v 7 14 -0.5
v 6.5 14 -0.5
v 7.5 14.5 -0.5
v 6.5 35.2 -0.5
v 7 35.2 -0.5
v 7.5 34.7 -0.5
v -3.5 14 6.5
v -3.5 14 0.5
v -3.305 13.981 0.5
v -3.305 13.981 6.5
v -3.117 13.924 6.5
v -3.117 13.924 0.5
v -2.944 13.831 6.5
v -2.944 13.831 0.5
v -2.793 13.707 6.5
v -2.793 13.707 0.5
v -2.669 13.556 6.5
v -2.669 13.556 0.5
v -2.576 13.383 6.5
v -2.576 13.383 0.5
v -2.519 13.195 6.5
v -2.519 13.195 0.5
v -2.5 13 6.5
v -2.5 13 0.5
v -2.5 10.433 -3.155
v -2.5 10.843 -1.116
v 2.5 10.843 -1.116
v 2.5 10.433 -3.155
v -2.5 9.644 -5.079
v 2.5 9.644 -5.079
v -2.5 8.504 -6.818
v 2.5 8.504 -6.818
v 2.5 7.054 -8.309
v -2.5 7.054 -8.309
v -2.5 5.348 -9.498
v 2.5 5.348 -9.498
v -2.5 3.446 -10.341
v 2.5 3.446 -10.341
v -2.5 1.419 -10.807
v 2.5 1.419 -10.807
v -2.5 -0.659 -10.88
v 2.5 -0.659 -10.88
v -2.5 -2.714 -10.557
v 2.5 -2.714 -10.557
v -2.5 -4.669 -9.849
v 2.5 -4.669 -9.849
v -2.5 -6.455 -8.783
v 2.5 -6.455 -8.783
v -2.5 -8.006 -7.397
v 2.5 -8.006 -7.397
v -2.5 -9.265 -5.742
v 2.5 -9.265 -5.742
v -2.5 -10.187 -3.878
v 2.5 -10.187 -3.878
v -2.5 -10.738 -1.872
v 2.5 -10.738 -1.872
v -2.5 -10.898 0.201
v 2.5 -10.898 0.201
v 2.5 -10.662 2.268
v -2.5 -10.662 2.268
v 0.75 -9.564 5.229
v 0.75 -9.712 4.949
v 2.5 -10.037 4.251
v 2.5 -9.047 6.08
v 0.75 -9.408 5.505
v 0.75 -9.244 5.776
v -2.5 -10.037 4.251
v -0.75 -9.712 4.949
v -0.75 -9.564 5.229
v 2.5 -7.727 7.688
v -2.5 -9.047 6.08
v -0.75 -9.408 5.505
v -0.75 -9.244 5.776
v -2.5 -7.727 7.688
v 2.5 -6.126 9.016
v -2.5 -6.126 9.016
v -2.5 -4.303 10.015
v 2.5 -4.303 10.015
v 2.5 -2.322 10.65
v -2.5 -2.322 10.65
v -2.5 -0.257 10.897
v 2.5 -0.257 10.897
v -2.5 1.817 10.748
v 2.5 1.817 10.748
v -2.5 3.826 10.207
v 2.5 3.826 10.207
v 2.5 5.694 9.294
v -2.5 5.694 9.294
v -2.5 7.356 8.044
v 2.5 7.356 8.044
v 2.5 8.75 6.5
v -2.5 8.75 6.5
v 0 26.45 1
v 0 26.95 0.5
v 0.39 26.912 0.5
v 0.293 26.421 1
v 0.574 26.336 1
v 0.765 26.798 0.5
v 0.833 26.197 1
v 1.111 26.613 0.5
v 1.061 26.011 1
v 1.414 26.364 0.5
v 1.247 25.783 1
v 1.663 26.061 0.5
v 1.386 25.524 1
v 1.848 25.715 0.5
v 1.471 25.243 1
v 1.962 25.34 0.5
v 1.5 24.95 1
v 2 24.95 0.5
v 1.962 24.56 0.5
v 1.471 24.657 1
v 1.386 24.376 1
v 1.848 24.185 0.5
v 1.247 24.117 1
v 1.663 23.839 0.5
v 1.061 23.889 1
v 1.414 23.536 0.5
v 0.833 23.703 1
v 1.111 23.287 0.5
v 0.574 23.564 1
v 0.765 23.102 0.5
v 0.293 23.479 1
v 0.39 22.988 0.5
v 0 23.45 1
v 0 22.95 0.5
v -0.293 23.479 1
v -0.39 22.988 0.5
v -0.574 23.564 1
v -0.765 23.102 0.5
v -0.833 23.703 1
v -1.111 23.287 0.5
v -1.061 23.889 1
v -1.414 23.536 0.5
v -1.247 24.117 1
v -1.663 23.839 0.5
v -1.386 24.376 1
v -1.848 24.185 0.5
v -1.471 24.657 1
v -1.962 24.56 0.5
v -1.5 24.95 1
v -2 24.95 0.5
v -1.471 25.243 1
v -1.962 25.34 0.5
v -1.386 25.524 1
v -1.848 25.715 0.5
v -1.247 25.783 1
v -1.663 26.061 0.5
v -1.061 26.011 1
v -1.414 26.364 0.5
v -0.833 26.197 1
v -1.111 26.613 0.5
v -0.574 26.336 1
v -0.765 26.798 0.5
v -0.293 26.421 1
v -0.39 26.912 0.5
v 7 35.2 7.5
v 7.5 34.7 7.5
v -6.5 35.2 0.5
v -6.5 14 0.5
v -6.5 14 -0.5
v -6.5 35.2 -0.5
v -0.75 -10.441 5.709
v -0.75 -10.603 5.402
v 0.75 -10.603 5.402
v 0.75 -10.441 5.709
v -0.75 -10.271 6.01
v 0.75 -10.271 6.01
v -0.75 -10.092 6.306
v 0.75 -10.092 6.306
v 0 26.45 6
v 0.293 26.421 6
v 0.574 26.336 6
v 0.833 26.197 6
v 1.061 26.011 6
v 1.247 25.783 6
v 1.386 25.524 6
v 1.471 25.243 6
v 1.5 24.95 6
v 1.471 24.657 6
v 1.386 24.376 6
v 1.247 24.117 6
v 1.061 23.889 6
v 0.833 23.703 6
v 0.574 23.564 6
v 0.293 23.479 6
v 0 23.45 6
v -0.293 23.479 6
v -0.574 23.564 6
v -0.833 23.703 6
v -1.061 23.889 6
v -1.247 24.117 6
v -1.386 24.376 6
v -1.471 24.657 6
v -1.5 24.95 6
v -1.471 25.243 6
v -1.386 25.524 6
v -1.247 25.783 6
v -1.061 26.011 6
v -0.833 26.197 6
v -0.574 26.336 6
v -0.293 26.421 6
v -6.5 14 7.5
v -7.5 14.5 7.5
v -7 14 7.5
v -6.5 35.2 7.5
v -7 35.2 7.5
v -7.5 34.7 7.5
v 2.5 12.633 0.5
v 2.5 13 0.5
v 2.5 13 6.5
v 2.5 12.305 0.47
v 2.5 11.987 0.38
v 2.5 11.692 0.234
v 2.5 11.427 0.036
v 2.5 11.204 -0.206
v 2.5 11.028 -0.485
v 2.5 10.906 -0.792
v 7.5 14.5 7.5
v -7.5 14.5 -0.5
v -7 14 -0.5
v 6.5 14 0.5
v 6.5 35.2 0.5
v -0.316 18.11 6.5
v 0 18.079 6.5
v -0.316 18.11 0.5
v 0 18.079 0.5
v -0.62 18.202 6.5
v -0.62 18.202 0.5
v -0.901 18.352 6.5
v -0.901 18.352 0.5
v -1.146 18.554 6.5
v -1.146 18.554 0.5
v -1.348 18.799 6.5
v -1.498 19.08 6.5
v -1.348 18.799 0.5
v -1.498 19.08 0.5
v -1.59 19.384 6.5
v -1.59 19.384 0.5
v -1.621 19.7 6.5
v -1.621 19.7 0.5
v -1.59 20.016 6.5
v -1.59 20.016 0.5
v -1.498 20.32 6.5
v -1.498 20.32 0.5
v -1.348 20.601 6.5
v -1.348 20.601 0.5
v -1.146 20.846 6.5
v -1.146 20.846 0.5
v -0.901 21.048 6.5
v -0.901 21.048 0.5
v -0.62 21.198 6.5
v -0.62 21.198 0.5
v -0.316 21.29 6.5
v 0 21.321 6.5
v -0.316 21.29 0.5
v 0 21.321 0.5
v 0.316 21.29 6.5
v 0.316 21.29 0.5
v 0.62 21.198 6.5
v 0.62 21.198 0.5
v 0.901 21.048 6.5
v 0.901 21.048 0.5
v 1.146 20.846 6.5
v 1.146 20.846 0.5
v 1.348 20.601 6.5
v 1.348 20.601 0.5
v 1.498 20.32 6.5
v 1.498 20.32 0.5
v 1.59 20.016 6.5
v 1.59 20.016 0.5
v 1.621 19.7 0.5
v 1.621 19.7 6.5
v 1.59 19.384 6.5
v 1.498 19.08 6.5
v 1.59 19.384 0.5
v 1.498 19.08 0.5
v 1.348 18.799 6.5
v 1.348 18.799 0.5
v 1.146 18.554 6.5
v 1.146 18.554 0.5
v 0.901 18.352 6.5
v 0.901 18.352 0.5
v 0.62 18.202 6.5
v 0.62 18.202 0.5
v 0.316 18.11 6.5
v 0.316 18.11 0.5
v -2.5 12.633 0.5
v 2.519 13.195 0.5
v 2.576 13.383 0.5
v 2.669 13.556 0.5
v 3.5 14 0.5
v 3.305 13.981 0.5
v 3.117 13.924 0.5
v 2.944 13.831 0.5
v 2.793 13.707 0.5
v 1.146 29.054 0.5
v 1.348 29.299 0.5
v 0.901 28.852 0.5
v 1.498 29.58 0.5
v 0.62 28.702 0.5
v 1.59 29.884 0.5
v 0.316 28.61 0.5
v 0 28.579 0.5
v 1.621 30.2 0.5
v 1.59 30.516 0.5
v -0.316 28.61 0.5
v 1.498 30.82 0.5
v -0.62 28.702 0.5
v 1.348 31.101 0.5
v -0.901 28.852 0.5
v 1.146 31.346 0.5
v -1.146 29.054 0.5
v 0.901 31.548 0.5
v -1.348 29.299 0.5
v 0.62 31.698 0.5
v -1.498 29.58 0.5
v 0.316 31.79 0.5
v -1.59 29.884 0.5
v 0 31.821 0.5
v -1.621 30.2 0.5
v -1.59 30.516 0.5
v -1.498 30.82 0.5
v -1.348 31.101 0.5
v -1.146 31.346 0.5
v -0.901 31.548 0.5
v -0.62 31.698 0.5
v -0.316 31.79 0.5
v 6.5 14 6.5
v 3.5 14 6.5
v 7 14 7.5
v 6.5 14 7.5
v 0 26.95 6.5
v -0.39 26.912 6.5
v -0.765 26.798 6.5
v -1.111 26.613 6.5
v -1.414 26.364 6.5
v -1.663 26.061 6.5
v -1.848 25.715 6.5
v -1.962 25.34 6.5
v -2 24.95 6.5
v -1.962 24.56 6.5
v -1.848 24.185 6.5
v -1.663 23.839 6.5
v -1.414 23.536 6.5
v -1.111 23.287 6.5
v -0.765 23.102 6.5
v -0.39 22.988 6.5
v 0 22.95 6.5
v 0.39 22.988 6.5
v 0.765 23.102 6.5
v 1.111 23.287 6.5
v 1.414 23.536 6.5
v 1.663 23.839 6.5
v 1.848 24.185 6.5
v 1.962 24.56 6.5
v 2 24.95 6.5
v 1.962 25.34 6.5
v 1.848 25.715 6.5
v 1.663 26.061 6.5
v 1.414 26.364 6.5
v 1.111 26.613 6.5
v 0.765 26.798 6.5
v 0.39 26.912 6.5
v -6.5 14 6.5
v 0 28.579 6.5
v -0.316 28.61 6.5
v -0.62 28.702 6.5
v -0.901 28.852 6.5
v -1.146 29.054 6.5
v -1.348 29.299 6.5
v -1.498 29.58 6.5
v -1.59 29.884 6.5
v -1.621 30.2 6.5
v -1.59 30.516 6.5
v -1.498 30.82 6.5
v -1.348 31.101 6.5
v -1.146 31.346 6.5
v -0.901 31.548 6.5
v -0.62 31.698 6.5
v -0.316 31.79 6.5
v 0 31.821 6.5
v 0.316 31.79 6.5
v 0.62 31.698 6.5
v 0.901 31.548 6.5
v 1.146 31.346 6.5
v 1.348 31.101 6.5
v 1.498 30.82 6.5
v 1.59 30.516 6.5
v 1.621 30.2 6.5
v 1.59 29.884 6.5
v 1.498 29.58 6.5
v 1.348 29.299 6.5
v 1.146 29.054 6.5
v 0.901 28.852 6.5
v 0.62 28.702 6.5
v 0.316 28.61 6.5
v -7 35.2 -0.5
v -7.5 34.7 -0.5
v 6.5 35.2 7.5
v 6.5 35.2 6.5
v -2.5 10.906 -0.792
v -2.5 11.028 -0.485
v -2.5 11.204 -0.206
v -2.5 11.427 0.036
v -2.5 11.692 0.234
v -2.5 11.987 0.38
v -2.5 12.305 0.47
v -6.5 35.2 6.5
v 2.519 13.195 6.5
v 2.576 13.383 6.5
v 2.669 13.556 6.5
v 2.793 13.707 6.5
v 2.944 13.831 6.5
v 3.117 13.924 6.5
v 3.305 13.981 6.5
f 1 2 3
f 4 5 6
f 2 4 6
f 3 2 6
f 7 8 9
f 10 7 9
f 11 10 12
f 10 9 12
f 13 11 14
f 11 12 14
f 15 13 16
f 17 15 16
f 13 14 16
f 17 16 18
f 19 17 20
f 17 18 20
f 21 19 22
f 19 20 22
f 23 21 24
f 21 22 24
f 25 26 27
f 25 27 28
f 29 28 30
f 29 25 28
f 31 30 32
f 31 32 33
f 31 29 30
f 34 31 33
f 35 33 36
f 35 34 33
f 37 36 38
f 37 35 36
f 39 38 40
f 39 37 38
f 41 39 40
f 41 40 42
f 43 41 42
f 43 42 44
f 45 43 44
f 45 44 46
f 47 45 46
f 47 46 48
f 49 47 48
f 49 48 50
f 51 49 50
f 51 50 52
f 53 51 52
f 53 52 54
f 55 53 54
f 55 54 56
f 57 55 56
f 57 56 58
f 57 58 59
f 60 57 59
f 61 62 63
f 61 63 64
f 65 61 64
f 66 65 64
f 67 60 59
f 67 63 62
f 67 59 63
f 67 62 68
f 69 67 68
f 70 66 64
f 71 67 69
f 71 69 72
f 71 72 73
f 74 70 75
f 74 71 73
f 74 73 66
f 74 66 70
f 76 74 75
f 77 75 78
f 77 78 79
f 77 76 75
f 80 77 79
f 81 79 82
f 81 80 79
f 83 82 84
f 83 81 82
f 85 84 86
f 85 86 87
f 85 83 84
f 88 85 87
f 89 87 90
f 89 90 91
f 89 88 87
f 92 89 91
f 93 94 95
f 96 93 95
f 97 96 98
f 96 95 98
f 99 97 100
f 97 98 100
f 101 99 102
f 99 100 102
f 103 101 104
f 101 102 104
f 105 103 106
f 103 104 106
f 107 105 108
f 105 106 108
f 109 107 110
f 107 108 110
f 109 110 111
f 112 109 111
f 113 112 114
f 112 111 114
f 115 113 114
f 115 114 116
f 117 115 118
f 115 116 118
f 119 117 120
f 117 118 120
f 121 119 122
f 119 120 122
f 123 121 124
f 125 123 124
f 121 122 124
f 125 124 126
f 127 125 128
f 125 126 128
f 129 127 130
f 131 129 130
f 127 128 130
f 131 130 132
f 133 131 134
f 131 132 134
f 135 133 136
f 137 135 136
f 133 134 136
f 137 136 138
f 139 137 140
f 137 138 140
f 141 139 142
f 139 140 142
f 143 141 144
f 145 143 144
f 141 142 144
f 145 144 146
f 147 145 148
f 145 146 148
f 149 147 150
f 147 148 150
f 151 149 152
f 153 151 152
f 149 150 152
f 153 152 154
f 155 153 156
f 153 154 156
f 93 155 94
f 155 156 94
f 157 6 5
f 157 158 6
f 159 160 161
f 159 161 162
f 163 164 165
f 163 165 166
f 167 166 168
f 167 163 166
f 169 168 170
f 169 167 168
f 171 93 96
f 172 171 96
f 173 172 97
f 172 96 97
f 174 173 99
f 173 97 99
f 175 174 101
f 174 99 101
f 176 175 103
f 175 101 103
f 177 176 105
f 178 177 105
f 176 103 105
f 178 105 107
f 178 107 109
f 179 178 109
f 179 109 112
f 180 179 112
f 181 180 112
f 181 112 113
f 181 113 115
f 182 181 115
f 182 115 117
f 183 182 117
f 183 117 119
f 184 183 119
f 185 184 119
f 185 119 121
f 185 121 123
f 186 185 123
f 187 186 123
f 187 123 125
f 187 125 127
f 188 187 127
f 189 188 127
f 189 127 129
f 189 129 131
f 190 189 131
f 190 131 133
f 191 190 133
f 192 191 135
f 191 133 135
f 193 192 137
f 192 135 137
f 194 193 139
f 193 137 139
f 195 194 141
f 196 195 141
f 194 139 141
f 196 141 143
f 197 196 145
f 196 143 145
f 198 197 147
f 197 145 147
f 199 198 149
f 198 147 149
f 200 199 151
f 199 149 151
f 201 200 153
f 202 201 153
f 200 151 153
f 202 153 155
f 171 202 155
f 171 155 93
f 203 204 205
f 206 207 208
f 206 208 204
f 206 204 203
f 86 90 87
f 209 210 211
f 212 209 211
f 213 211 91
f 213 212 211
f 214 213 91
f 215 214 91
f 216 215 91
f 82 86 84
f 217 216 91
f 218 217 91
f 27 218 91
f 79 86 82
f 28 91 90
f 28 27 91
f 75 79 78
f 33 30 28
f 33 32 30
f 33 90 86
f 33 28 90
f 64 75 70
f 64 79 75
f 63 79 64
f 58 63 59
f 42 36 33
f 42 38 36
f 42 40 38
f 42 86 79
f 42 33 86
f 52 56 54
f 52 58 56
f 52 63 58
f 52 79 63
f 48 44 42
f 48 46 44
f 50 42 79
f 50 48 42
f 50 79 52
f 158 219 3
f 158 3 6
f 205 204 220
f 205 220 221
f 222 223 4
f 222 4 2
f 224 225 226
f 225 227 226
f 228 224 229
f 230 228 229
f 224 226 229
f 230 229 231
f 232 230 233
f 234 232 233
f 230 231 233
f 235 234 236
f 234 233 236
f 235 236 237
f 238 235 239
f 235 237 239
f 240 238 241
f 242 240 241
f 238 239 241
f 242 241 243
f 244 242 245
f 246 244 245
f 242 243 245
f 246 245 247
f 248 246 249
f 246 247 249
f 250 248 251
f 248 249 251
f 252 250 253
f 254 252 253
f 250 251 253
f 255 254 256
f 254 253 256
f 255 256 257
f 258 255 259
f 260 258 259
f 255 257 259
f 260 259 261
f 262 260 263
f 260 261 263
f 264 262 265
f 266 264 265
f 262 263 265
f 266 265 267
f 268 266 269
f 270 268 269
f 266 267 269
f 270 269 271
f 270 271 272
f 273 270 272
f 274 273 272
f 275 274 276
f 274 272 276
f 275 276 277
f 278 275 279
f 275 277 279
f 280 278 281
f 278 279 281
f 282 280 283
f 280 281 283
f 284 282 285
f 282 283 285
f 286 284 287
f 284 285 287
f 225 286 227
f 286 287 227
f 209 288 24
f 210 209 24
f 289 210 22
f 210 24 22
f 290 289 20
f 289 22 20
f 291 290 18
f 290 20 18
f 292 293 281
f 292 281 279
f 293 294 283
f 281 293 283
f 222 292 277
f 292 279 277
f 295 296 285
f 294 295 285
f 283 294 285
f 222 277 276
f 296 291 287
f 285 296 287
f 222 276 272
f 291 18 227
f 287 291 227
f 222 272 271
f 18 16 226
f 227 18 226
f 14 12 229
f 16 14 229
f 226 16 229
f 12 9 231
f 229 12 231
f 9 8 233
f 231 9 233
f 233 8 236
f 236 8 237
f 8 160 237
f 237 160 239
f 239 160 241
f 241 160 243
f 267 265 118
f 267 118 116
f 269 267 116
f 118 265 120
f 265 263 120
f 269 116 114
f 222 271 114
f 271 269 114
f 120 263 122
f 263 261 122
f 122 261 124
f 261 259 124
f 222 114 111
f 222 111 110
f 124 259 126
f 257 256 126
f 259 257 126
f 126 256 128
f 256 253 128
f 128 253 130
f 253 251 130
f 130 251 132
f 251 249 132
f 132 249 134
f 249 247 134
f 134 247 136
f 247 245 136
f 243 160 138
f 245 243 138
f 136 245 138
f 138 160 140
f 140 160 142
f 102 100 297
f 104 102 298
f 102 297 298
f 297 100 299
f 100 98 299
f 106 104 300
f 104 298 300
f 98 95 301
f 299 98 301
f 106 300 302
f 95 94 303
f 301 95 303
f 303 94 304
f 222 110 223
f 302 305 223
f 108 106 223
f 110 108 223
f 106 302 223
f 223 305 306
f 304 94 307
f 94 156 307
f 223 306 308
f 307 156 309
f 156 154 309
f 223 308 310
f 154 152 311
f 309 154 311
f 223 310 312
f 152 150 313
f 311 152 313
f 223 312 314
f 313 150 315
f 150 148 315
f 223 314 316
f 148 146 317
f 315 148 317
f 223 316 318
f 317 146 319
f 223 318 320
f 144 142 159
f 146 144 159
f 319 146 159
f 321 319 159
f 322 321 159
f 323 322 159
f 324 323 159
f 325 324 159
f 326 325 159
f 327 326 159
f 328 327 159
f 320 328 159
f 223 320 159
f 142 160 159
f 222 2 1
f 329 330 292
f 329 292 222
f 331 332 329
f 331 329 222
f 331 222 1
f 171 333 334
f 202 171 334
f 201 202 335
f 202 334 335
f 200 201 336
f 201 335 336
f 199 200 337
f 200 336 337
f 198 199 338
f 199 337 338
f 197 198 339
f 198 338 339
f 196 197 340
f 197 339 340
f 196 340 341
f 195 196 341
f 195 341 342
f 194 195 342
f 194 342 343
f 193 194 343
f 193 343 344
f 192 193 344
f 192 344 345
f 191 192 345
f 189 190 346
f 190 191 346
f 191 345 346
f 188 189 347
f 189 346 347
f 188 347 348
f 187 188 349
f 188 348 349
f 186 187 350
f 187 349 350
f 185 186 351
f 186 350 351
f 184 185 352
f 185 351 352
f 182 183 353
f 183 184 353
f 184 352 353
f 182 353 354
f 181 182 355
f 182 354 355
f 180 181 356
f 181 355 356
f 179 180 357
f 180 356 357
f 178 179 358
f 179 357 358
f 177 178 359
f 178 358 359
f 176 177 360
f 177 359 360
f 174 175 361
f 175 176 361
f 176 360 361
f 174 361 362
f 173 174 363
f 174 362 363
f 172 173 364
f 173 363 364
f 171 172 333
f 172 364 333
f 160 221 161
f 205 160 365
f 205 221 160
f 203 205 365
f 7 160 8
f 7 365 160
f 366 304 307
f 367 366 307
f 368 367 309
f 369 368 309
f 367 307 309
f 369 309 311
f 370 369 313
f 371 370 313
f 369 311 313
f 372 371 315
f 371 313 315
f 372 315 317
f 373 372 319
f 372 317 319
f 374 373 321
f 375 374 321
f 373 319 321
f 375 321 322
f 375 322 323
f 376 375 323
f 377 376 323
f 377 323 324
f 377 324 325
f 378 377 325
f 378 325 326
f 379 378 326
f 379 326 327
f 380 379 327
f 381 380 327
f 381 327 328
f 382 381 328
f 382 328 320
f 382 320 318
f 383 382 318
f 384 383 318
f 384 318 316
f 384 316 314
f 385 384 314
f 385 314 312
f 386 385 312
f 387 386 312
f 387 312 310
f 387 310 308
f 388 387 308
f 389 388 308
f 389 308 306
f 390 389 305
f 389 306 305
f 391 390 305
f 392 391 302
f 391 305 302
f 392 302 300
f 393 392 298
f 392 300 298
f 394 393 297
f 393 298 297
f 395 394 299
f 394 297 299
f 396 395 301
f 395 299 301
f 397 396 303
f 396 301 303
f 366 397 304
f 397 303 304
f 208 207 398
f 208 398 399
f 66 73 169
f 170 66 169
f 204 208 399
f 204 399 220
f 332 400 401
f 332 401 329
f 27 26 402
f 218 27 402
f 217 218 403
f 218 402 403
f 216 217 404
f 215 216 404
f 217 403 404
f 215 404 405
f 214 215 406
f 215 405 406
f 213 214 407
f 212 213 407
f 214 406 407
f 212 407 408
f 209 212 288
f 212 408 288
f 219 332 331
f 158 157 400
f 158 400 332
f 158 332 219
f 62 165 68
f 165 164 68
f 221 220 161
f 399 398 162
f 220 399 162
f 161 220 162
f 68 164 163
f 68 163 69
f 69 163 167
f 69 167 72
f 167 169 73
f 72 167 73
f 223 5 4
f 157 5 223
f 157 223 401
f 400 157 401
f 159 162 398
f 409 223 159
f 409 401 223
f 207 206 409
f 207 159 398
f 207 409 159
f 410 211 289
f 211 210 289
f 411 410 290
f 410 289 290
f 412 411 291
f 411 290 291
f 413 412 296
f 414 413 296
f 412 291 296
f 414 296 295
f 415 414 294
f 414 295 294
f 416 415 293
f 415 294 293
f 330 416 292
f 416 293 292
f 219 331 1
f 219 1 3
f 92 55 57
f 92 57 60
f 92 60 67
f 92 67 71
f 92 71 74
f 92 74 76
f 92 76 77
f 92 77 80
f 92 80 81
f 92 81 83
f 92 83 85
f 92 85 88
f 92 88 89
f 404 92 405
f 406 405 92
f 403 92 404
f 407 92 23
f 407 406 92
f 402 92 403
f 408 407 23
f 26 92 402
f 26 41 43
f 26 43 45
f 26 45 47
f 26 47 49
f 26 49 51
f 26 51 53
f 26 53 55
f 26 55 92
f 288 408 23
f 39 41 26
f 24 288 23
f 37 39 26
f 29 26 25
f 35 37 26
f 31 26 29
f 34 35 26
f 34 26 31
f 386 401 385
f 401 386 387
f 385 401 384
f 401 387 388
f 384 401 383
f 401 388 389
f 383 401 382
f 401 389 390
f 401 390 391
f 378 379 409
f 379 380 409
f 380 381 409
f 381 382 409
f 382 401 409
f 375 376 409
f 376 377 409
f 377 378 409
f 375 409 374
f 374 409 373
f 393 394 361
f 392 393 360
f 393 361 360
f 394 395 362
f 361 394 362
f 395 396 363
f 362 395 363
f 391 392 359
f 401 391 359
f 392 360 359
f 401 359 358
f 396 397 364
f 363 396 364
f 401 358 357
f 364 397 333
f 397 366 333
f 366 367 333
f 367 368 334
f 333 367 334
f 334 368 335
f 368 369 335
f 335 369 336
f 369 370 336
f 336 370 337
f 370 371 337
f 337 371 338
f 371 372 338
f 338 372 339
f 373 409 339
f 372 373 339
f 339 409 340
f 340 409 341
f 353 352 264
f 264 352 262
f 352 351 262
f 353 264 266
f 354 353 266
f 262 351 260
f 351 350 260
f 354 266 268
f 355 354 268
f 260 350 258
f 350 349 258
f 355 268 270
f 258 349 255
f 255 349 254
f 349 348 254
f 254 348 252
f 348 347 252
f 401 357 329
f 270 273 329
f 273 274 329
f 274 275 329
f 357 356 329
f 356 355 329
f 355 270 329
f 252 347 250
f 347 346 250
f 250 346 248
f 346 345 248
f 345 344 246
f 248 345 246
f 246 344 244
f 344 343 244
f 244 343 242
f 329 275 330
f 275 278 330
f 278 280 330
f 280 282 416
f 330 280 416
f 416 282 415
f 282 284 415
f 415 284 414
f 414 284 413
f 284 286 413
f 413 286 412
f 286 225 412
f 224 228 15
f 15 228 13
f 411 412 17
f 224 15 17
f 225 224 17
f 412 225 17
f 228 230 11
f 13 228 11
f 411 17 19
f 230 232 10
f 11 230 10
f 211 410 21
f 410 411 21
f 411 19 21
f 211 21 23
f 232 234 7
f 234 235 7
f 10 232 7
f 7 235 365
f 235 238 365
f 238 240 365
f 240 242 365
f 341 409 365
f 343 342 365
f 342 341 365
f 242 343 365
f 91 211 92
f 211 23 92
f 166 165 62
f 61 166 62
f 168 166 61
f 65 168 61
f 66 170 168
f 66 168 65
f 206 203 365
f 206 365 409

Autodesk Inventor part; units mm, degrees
sketch "Sketch_1" plane through (0, 0, 0) normal (1, 0, 0) x (0, 1, 0)
  arc A0 (8.7499, 6.5) -> (10.8427, -1.1157) centre (0, 0) ccw
  arc A1 (12.6333, 0.5) -> (10.8427, -1.1157) centre (12.6333, -1.3) ccw
  line L0 (12.6333, 0.5) -> (35.2, 0.5)
  line L1 (35.2, 0.5) -> (35.2, 6.5)
  line L2 (35.2, 6.5) -> (8.7499, 6.5)
extrude "Extrusion1" add sketch "Sketch_1" along normal mid plane 13
sketch "Sketch_2" plane through (0, 0, 0) normal (0, 0, 1) x (1, 0, 0)
  line L0 (-6.5, -21.8) -> (6.5, -21.8)
  line L1 (6.5, -21.8) -> (6.5, 14)
  line L2 (6.5, 14) -> (3.5, 14)
  arc A0 (3.5, 14) -> (2.5, 13) centre (3.5, 13) ccw
  line L3 (2.5, 13) -> (2.5, -18.8)
  line L4 (2.5, -18.8) -> (-2.5, -18.8)
  line L5 (-2.5, -18.8) -> (-2.5, 13)
  arc A1 (-2.5, 13) -> (-3.5, 14) centre (-3.5, 13) ccw
  line L6 (-3.5, 14) -> (-6.5, 14)
  line L7 (-6.5, 14) -> (-6.5, -21.8)
extrude "Extrusion2" cut sketch "Sketch_2" along normal mid plane 30
sketch "Sketch_3" plane through (0, 0, 7.5) normal (0, 0, 1) x (1, 0, 0)
  line L0 (6.5, 14) -> (7, 14)
  line L1 (7, 14) -> (7.5, 14.5)
  line L2 (7.5, 14.5) -> (7.5, 34.7)
  line L3 (7.5, 34.7) -> (7, 35.2)
  line L4 (7, 35.2) -> (6.5, 35.2)
  line L5 (6.5, 35.2) -> (6.5, 14)
extrude "Extrusion3" add sketch "Sketch_3" against normal blind 8
sketch "Sketch_4" plane through (0, 0, 7.5) normal (0, 0, 1) x (1, 0, 0)
  line L0 (-7.5, 14.5) -> (-7, 14)
  line L1 (-7, 14) -> (-6.5, 14)
  line L2 (-6.5, 14) -> (-6.5, 35.2)
  line L3 (-6.5, 35.2) -> (-7, 35.2)
  line L4 (-7, 35.2) -> (-7.5, 34.7)
  line L5 (-7.5, 34.7) -> (-7.5, 14.5)
extrude "Extrusion4" add sketch "Sketch_4" against normal blind 8
sketch "Sketch_5" plane through (0, 0, 0) normal (1, 0, 0) x (0, 1, 0)
  line L0 (24.95, 0.5) -> (24.95, 6.5)
  line L1 (24.95, 6.5) -> (26.95, 6.5)
  line L2 (26.95, 6.5) -> (26.45, 6)
  line L3 (26.45, 6) -> (26.45, 1)
  line L4 (26.45, 1) -> (26.95, 0.5)
  line L5 (26.95, 0.5) -> (24.95, 0.5)
  line L6 (24.95, 0.5) -> (24.95, 6.5)
revolve "Revolution1" cut sketch "Sketch_5" angle 360 about axis through (0, 24.95, 0.5) along (0, 0, -1)
sketch "Sketch6" plane through (-2.5, 8.7499, 6.5) normal (0, 0, 1) x (1, 0, 0)
  point P0 (2.5, 10.9501)
hole "Hole1" at (0, 19.7, 6.5) direction (0, 0, -1) diameter 3.242 depth 6 thread size "M4x0.7" class "6H" standard "ISO Metric profile"
sketch "Sketch7" plane through (-2.5, 8.7499, 6.5) normal (0, 0, 1) x (1, 0, 0)
  point P0 (2.5, 21.4501)
hole "Hole2" at (0, 30.2, 6.5) direction (0, 0, -1) diameter 3.242 depth 6 thread size "M4x0.7" class "6H" standard "ISO Metric profile"
sketch "Sketch_9" plane through (0, 0, 0) normal (1, 0, 0) x (0, 1, 0)
  arc A0 (-10.0918, 6.306) -> (-10.603, 5.4025) centre (0, 0) ccw
  line L0 (-10.603, 5.4025) -> (0, 0)
  line L1 (0, 0) -> (-10.0918, 6.306)
extrude "Extrusion5" add sketch "Sketch_9" along normal mid plane 1.5
ref_plane "GRIFF_XY" through (0, 0, 0) normal (1, 0, 0) x (0, 0, -1)
ref_plane "GRIFF_YZ" through (0, 0, 0) normal (0, 0, -1) x (0, 1, 0)
ref_plane "GRIFF_ZX" through (0, 0, 0) normal (0, 1, 0) x (1, 0, 0)
properties part number "1310162 DHRS-25-A---(Griff)"
